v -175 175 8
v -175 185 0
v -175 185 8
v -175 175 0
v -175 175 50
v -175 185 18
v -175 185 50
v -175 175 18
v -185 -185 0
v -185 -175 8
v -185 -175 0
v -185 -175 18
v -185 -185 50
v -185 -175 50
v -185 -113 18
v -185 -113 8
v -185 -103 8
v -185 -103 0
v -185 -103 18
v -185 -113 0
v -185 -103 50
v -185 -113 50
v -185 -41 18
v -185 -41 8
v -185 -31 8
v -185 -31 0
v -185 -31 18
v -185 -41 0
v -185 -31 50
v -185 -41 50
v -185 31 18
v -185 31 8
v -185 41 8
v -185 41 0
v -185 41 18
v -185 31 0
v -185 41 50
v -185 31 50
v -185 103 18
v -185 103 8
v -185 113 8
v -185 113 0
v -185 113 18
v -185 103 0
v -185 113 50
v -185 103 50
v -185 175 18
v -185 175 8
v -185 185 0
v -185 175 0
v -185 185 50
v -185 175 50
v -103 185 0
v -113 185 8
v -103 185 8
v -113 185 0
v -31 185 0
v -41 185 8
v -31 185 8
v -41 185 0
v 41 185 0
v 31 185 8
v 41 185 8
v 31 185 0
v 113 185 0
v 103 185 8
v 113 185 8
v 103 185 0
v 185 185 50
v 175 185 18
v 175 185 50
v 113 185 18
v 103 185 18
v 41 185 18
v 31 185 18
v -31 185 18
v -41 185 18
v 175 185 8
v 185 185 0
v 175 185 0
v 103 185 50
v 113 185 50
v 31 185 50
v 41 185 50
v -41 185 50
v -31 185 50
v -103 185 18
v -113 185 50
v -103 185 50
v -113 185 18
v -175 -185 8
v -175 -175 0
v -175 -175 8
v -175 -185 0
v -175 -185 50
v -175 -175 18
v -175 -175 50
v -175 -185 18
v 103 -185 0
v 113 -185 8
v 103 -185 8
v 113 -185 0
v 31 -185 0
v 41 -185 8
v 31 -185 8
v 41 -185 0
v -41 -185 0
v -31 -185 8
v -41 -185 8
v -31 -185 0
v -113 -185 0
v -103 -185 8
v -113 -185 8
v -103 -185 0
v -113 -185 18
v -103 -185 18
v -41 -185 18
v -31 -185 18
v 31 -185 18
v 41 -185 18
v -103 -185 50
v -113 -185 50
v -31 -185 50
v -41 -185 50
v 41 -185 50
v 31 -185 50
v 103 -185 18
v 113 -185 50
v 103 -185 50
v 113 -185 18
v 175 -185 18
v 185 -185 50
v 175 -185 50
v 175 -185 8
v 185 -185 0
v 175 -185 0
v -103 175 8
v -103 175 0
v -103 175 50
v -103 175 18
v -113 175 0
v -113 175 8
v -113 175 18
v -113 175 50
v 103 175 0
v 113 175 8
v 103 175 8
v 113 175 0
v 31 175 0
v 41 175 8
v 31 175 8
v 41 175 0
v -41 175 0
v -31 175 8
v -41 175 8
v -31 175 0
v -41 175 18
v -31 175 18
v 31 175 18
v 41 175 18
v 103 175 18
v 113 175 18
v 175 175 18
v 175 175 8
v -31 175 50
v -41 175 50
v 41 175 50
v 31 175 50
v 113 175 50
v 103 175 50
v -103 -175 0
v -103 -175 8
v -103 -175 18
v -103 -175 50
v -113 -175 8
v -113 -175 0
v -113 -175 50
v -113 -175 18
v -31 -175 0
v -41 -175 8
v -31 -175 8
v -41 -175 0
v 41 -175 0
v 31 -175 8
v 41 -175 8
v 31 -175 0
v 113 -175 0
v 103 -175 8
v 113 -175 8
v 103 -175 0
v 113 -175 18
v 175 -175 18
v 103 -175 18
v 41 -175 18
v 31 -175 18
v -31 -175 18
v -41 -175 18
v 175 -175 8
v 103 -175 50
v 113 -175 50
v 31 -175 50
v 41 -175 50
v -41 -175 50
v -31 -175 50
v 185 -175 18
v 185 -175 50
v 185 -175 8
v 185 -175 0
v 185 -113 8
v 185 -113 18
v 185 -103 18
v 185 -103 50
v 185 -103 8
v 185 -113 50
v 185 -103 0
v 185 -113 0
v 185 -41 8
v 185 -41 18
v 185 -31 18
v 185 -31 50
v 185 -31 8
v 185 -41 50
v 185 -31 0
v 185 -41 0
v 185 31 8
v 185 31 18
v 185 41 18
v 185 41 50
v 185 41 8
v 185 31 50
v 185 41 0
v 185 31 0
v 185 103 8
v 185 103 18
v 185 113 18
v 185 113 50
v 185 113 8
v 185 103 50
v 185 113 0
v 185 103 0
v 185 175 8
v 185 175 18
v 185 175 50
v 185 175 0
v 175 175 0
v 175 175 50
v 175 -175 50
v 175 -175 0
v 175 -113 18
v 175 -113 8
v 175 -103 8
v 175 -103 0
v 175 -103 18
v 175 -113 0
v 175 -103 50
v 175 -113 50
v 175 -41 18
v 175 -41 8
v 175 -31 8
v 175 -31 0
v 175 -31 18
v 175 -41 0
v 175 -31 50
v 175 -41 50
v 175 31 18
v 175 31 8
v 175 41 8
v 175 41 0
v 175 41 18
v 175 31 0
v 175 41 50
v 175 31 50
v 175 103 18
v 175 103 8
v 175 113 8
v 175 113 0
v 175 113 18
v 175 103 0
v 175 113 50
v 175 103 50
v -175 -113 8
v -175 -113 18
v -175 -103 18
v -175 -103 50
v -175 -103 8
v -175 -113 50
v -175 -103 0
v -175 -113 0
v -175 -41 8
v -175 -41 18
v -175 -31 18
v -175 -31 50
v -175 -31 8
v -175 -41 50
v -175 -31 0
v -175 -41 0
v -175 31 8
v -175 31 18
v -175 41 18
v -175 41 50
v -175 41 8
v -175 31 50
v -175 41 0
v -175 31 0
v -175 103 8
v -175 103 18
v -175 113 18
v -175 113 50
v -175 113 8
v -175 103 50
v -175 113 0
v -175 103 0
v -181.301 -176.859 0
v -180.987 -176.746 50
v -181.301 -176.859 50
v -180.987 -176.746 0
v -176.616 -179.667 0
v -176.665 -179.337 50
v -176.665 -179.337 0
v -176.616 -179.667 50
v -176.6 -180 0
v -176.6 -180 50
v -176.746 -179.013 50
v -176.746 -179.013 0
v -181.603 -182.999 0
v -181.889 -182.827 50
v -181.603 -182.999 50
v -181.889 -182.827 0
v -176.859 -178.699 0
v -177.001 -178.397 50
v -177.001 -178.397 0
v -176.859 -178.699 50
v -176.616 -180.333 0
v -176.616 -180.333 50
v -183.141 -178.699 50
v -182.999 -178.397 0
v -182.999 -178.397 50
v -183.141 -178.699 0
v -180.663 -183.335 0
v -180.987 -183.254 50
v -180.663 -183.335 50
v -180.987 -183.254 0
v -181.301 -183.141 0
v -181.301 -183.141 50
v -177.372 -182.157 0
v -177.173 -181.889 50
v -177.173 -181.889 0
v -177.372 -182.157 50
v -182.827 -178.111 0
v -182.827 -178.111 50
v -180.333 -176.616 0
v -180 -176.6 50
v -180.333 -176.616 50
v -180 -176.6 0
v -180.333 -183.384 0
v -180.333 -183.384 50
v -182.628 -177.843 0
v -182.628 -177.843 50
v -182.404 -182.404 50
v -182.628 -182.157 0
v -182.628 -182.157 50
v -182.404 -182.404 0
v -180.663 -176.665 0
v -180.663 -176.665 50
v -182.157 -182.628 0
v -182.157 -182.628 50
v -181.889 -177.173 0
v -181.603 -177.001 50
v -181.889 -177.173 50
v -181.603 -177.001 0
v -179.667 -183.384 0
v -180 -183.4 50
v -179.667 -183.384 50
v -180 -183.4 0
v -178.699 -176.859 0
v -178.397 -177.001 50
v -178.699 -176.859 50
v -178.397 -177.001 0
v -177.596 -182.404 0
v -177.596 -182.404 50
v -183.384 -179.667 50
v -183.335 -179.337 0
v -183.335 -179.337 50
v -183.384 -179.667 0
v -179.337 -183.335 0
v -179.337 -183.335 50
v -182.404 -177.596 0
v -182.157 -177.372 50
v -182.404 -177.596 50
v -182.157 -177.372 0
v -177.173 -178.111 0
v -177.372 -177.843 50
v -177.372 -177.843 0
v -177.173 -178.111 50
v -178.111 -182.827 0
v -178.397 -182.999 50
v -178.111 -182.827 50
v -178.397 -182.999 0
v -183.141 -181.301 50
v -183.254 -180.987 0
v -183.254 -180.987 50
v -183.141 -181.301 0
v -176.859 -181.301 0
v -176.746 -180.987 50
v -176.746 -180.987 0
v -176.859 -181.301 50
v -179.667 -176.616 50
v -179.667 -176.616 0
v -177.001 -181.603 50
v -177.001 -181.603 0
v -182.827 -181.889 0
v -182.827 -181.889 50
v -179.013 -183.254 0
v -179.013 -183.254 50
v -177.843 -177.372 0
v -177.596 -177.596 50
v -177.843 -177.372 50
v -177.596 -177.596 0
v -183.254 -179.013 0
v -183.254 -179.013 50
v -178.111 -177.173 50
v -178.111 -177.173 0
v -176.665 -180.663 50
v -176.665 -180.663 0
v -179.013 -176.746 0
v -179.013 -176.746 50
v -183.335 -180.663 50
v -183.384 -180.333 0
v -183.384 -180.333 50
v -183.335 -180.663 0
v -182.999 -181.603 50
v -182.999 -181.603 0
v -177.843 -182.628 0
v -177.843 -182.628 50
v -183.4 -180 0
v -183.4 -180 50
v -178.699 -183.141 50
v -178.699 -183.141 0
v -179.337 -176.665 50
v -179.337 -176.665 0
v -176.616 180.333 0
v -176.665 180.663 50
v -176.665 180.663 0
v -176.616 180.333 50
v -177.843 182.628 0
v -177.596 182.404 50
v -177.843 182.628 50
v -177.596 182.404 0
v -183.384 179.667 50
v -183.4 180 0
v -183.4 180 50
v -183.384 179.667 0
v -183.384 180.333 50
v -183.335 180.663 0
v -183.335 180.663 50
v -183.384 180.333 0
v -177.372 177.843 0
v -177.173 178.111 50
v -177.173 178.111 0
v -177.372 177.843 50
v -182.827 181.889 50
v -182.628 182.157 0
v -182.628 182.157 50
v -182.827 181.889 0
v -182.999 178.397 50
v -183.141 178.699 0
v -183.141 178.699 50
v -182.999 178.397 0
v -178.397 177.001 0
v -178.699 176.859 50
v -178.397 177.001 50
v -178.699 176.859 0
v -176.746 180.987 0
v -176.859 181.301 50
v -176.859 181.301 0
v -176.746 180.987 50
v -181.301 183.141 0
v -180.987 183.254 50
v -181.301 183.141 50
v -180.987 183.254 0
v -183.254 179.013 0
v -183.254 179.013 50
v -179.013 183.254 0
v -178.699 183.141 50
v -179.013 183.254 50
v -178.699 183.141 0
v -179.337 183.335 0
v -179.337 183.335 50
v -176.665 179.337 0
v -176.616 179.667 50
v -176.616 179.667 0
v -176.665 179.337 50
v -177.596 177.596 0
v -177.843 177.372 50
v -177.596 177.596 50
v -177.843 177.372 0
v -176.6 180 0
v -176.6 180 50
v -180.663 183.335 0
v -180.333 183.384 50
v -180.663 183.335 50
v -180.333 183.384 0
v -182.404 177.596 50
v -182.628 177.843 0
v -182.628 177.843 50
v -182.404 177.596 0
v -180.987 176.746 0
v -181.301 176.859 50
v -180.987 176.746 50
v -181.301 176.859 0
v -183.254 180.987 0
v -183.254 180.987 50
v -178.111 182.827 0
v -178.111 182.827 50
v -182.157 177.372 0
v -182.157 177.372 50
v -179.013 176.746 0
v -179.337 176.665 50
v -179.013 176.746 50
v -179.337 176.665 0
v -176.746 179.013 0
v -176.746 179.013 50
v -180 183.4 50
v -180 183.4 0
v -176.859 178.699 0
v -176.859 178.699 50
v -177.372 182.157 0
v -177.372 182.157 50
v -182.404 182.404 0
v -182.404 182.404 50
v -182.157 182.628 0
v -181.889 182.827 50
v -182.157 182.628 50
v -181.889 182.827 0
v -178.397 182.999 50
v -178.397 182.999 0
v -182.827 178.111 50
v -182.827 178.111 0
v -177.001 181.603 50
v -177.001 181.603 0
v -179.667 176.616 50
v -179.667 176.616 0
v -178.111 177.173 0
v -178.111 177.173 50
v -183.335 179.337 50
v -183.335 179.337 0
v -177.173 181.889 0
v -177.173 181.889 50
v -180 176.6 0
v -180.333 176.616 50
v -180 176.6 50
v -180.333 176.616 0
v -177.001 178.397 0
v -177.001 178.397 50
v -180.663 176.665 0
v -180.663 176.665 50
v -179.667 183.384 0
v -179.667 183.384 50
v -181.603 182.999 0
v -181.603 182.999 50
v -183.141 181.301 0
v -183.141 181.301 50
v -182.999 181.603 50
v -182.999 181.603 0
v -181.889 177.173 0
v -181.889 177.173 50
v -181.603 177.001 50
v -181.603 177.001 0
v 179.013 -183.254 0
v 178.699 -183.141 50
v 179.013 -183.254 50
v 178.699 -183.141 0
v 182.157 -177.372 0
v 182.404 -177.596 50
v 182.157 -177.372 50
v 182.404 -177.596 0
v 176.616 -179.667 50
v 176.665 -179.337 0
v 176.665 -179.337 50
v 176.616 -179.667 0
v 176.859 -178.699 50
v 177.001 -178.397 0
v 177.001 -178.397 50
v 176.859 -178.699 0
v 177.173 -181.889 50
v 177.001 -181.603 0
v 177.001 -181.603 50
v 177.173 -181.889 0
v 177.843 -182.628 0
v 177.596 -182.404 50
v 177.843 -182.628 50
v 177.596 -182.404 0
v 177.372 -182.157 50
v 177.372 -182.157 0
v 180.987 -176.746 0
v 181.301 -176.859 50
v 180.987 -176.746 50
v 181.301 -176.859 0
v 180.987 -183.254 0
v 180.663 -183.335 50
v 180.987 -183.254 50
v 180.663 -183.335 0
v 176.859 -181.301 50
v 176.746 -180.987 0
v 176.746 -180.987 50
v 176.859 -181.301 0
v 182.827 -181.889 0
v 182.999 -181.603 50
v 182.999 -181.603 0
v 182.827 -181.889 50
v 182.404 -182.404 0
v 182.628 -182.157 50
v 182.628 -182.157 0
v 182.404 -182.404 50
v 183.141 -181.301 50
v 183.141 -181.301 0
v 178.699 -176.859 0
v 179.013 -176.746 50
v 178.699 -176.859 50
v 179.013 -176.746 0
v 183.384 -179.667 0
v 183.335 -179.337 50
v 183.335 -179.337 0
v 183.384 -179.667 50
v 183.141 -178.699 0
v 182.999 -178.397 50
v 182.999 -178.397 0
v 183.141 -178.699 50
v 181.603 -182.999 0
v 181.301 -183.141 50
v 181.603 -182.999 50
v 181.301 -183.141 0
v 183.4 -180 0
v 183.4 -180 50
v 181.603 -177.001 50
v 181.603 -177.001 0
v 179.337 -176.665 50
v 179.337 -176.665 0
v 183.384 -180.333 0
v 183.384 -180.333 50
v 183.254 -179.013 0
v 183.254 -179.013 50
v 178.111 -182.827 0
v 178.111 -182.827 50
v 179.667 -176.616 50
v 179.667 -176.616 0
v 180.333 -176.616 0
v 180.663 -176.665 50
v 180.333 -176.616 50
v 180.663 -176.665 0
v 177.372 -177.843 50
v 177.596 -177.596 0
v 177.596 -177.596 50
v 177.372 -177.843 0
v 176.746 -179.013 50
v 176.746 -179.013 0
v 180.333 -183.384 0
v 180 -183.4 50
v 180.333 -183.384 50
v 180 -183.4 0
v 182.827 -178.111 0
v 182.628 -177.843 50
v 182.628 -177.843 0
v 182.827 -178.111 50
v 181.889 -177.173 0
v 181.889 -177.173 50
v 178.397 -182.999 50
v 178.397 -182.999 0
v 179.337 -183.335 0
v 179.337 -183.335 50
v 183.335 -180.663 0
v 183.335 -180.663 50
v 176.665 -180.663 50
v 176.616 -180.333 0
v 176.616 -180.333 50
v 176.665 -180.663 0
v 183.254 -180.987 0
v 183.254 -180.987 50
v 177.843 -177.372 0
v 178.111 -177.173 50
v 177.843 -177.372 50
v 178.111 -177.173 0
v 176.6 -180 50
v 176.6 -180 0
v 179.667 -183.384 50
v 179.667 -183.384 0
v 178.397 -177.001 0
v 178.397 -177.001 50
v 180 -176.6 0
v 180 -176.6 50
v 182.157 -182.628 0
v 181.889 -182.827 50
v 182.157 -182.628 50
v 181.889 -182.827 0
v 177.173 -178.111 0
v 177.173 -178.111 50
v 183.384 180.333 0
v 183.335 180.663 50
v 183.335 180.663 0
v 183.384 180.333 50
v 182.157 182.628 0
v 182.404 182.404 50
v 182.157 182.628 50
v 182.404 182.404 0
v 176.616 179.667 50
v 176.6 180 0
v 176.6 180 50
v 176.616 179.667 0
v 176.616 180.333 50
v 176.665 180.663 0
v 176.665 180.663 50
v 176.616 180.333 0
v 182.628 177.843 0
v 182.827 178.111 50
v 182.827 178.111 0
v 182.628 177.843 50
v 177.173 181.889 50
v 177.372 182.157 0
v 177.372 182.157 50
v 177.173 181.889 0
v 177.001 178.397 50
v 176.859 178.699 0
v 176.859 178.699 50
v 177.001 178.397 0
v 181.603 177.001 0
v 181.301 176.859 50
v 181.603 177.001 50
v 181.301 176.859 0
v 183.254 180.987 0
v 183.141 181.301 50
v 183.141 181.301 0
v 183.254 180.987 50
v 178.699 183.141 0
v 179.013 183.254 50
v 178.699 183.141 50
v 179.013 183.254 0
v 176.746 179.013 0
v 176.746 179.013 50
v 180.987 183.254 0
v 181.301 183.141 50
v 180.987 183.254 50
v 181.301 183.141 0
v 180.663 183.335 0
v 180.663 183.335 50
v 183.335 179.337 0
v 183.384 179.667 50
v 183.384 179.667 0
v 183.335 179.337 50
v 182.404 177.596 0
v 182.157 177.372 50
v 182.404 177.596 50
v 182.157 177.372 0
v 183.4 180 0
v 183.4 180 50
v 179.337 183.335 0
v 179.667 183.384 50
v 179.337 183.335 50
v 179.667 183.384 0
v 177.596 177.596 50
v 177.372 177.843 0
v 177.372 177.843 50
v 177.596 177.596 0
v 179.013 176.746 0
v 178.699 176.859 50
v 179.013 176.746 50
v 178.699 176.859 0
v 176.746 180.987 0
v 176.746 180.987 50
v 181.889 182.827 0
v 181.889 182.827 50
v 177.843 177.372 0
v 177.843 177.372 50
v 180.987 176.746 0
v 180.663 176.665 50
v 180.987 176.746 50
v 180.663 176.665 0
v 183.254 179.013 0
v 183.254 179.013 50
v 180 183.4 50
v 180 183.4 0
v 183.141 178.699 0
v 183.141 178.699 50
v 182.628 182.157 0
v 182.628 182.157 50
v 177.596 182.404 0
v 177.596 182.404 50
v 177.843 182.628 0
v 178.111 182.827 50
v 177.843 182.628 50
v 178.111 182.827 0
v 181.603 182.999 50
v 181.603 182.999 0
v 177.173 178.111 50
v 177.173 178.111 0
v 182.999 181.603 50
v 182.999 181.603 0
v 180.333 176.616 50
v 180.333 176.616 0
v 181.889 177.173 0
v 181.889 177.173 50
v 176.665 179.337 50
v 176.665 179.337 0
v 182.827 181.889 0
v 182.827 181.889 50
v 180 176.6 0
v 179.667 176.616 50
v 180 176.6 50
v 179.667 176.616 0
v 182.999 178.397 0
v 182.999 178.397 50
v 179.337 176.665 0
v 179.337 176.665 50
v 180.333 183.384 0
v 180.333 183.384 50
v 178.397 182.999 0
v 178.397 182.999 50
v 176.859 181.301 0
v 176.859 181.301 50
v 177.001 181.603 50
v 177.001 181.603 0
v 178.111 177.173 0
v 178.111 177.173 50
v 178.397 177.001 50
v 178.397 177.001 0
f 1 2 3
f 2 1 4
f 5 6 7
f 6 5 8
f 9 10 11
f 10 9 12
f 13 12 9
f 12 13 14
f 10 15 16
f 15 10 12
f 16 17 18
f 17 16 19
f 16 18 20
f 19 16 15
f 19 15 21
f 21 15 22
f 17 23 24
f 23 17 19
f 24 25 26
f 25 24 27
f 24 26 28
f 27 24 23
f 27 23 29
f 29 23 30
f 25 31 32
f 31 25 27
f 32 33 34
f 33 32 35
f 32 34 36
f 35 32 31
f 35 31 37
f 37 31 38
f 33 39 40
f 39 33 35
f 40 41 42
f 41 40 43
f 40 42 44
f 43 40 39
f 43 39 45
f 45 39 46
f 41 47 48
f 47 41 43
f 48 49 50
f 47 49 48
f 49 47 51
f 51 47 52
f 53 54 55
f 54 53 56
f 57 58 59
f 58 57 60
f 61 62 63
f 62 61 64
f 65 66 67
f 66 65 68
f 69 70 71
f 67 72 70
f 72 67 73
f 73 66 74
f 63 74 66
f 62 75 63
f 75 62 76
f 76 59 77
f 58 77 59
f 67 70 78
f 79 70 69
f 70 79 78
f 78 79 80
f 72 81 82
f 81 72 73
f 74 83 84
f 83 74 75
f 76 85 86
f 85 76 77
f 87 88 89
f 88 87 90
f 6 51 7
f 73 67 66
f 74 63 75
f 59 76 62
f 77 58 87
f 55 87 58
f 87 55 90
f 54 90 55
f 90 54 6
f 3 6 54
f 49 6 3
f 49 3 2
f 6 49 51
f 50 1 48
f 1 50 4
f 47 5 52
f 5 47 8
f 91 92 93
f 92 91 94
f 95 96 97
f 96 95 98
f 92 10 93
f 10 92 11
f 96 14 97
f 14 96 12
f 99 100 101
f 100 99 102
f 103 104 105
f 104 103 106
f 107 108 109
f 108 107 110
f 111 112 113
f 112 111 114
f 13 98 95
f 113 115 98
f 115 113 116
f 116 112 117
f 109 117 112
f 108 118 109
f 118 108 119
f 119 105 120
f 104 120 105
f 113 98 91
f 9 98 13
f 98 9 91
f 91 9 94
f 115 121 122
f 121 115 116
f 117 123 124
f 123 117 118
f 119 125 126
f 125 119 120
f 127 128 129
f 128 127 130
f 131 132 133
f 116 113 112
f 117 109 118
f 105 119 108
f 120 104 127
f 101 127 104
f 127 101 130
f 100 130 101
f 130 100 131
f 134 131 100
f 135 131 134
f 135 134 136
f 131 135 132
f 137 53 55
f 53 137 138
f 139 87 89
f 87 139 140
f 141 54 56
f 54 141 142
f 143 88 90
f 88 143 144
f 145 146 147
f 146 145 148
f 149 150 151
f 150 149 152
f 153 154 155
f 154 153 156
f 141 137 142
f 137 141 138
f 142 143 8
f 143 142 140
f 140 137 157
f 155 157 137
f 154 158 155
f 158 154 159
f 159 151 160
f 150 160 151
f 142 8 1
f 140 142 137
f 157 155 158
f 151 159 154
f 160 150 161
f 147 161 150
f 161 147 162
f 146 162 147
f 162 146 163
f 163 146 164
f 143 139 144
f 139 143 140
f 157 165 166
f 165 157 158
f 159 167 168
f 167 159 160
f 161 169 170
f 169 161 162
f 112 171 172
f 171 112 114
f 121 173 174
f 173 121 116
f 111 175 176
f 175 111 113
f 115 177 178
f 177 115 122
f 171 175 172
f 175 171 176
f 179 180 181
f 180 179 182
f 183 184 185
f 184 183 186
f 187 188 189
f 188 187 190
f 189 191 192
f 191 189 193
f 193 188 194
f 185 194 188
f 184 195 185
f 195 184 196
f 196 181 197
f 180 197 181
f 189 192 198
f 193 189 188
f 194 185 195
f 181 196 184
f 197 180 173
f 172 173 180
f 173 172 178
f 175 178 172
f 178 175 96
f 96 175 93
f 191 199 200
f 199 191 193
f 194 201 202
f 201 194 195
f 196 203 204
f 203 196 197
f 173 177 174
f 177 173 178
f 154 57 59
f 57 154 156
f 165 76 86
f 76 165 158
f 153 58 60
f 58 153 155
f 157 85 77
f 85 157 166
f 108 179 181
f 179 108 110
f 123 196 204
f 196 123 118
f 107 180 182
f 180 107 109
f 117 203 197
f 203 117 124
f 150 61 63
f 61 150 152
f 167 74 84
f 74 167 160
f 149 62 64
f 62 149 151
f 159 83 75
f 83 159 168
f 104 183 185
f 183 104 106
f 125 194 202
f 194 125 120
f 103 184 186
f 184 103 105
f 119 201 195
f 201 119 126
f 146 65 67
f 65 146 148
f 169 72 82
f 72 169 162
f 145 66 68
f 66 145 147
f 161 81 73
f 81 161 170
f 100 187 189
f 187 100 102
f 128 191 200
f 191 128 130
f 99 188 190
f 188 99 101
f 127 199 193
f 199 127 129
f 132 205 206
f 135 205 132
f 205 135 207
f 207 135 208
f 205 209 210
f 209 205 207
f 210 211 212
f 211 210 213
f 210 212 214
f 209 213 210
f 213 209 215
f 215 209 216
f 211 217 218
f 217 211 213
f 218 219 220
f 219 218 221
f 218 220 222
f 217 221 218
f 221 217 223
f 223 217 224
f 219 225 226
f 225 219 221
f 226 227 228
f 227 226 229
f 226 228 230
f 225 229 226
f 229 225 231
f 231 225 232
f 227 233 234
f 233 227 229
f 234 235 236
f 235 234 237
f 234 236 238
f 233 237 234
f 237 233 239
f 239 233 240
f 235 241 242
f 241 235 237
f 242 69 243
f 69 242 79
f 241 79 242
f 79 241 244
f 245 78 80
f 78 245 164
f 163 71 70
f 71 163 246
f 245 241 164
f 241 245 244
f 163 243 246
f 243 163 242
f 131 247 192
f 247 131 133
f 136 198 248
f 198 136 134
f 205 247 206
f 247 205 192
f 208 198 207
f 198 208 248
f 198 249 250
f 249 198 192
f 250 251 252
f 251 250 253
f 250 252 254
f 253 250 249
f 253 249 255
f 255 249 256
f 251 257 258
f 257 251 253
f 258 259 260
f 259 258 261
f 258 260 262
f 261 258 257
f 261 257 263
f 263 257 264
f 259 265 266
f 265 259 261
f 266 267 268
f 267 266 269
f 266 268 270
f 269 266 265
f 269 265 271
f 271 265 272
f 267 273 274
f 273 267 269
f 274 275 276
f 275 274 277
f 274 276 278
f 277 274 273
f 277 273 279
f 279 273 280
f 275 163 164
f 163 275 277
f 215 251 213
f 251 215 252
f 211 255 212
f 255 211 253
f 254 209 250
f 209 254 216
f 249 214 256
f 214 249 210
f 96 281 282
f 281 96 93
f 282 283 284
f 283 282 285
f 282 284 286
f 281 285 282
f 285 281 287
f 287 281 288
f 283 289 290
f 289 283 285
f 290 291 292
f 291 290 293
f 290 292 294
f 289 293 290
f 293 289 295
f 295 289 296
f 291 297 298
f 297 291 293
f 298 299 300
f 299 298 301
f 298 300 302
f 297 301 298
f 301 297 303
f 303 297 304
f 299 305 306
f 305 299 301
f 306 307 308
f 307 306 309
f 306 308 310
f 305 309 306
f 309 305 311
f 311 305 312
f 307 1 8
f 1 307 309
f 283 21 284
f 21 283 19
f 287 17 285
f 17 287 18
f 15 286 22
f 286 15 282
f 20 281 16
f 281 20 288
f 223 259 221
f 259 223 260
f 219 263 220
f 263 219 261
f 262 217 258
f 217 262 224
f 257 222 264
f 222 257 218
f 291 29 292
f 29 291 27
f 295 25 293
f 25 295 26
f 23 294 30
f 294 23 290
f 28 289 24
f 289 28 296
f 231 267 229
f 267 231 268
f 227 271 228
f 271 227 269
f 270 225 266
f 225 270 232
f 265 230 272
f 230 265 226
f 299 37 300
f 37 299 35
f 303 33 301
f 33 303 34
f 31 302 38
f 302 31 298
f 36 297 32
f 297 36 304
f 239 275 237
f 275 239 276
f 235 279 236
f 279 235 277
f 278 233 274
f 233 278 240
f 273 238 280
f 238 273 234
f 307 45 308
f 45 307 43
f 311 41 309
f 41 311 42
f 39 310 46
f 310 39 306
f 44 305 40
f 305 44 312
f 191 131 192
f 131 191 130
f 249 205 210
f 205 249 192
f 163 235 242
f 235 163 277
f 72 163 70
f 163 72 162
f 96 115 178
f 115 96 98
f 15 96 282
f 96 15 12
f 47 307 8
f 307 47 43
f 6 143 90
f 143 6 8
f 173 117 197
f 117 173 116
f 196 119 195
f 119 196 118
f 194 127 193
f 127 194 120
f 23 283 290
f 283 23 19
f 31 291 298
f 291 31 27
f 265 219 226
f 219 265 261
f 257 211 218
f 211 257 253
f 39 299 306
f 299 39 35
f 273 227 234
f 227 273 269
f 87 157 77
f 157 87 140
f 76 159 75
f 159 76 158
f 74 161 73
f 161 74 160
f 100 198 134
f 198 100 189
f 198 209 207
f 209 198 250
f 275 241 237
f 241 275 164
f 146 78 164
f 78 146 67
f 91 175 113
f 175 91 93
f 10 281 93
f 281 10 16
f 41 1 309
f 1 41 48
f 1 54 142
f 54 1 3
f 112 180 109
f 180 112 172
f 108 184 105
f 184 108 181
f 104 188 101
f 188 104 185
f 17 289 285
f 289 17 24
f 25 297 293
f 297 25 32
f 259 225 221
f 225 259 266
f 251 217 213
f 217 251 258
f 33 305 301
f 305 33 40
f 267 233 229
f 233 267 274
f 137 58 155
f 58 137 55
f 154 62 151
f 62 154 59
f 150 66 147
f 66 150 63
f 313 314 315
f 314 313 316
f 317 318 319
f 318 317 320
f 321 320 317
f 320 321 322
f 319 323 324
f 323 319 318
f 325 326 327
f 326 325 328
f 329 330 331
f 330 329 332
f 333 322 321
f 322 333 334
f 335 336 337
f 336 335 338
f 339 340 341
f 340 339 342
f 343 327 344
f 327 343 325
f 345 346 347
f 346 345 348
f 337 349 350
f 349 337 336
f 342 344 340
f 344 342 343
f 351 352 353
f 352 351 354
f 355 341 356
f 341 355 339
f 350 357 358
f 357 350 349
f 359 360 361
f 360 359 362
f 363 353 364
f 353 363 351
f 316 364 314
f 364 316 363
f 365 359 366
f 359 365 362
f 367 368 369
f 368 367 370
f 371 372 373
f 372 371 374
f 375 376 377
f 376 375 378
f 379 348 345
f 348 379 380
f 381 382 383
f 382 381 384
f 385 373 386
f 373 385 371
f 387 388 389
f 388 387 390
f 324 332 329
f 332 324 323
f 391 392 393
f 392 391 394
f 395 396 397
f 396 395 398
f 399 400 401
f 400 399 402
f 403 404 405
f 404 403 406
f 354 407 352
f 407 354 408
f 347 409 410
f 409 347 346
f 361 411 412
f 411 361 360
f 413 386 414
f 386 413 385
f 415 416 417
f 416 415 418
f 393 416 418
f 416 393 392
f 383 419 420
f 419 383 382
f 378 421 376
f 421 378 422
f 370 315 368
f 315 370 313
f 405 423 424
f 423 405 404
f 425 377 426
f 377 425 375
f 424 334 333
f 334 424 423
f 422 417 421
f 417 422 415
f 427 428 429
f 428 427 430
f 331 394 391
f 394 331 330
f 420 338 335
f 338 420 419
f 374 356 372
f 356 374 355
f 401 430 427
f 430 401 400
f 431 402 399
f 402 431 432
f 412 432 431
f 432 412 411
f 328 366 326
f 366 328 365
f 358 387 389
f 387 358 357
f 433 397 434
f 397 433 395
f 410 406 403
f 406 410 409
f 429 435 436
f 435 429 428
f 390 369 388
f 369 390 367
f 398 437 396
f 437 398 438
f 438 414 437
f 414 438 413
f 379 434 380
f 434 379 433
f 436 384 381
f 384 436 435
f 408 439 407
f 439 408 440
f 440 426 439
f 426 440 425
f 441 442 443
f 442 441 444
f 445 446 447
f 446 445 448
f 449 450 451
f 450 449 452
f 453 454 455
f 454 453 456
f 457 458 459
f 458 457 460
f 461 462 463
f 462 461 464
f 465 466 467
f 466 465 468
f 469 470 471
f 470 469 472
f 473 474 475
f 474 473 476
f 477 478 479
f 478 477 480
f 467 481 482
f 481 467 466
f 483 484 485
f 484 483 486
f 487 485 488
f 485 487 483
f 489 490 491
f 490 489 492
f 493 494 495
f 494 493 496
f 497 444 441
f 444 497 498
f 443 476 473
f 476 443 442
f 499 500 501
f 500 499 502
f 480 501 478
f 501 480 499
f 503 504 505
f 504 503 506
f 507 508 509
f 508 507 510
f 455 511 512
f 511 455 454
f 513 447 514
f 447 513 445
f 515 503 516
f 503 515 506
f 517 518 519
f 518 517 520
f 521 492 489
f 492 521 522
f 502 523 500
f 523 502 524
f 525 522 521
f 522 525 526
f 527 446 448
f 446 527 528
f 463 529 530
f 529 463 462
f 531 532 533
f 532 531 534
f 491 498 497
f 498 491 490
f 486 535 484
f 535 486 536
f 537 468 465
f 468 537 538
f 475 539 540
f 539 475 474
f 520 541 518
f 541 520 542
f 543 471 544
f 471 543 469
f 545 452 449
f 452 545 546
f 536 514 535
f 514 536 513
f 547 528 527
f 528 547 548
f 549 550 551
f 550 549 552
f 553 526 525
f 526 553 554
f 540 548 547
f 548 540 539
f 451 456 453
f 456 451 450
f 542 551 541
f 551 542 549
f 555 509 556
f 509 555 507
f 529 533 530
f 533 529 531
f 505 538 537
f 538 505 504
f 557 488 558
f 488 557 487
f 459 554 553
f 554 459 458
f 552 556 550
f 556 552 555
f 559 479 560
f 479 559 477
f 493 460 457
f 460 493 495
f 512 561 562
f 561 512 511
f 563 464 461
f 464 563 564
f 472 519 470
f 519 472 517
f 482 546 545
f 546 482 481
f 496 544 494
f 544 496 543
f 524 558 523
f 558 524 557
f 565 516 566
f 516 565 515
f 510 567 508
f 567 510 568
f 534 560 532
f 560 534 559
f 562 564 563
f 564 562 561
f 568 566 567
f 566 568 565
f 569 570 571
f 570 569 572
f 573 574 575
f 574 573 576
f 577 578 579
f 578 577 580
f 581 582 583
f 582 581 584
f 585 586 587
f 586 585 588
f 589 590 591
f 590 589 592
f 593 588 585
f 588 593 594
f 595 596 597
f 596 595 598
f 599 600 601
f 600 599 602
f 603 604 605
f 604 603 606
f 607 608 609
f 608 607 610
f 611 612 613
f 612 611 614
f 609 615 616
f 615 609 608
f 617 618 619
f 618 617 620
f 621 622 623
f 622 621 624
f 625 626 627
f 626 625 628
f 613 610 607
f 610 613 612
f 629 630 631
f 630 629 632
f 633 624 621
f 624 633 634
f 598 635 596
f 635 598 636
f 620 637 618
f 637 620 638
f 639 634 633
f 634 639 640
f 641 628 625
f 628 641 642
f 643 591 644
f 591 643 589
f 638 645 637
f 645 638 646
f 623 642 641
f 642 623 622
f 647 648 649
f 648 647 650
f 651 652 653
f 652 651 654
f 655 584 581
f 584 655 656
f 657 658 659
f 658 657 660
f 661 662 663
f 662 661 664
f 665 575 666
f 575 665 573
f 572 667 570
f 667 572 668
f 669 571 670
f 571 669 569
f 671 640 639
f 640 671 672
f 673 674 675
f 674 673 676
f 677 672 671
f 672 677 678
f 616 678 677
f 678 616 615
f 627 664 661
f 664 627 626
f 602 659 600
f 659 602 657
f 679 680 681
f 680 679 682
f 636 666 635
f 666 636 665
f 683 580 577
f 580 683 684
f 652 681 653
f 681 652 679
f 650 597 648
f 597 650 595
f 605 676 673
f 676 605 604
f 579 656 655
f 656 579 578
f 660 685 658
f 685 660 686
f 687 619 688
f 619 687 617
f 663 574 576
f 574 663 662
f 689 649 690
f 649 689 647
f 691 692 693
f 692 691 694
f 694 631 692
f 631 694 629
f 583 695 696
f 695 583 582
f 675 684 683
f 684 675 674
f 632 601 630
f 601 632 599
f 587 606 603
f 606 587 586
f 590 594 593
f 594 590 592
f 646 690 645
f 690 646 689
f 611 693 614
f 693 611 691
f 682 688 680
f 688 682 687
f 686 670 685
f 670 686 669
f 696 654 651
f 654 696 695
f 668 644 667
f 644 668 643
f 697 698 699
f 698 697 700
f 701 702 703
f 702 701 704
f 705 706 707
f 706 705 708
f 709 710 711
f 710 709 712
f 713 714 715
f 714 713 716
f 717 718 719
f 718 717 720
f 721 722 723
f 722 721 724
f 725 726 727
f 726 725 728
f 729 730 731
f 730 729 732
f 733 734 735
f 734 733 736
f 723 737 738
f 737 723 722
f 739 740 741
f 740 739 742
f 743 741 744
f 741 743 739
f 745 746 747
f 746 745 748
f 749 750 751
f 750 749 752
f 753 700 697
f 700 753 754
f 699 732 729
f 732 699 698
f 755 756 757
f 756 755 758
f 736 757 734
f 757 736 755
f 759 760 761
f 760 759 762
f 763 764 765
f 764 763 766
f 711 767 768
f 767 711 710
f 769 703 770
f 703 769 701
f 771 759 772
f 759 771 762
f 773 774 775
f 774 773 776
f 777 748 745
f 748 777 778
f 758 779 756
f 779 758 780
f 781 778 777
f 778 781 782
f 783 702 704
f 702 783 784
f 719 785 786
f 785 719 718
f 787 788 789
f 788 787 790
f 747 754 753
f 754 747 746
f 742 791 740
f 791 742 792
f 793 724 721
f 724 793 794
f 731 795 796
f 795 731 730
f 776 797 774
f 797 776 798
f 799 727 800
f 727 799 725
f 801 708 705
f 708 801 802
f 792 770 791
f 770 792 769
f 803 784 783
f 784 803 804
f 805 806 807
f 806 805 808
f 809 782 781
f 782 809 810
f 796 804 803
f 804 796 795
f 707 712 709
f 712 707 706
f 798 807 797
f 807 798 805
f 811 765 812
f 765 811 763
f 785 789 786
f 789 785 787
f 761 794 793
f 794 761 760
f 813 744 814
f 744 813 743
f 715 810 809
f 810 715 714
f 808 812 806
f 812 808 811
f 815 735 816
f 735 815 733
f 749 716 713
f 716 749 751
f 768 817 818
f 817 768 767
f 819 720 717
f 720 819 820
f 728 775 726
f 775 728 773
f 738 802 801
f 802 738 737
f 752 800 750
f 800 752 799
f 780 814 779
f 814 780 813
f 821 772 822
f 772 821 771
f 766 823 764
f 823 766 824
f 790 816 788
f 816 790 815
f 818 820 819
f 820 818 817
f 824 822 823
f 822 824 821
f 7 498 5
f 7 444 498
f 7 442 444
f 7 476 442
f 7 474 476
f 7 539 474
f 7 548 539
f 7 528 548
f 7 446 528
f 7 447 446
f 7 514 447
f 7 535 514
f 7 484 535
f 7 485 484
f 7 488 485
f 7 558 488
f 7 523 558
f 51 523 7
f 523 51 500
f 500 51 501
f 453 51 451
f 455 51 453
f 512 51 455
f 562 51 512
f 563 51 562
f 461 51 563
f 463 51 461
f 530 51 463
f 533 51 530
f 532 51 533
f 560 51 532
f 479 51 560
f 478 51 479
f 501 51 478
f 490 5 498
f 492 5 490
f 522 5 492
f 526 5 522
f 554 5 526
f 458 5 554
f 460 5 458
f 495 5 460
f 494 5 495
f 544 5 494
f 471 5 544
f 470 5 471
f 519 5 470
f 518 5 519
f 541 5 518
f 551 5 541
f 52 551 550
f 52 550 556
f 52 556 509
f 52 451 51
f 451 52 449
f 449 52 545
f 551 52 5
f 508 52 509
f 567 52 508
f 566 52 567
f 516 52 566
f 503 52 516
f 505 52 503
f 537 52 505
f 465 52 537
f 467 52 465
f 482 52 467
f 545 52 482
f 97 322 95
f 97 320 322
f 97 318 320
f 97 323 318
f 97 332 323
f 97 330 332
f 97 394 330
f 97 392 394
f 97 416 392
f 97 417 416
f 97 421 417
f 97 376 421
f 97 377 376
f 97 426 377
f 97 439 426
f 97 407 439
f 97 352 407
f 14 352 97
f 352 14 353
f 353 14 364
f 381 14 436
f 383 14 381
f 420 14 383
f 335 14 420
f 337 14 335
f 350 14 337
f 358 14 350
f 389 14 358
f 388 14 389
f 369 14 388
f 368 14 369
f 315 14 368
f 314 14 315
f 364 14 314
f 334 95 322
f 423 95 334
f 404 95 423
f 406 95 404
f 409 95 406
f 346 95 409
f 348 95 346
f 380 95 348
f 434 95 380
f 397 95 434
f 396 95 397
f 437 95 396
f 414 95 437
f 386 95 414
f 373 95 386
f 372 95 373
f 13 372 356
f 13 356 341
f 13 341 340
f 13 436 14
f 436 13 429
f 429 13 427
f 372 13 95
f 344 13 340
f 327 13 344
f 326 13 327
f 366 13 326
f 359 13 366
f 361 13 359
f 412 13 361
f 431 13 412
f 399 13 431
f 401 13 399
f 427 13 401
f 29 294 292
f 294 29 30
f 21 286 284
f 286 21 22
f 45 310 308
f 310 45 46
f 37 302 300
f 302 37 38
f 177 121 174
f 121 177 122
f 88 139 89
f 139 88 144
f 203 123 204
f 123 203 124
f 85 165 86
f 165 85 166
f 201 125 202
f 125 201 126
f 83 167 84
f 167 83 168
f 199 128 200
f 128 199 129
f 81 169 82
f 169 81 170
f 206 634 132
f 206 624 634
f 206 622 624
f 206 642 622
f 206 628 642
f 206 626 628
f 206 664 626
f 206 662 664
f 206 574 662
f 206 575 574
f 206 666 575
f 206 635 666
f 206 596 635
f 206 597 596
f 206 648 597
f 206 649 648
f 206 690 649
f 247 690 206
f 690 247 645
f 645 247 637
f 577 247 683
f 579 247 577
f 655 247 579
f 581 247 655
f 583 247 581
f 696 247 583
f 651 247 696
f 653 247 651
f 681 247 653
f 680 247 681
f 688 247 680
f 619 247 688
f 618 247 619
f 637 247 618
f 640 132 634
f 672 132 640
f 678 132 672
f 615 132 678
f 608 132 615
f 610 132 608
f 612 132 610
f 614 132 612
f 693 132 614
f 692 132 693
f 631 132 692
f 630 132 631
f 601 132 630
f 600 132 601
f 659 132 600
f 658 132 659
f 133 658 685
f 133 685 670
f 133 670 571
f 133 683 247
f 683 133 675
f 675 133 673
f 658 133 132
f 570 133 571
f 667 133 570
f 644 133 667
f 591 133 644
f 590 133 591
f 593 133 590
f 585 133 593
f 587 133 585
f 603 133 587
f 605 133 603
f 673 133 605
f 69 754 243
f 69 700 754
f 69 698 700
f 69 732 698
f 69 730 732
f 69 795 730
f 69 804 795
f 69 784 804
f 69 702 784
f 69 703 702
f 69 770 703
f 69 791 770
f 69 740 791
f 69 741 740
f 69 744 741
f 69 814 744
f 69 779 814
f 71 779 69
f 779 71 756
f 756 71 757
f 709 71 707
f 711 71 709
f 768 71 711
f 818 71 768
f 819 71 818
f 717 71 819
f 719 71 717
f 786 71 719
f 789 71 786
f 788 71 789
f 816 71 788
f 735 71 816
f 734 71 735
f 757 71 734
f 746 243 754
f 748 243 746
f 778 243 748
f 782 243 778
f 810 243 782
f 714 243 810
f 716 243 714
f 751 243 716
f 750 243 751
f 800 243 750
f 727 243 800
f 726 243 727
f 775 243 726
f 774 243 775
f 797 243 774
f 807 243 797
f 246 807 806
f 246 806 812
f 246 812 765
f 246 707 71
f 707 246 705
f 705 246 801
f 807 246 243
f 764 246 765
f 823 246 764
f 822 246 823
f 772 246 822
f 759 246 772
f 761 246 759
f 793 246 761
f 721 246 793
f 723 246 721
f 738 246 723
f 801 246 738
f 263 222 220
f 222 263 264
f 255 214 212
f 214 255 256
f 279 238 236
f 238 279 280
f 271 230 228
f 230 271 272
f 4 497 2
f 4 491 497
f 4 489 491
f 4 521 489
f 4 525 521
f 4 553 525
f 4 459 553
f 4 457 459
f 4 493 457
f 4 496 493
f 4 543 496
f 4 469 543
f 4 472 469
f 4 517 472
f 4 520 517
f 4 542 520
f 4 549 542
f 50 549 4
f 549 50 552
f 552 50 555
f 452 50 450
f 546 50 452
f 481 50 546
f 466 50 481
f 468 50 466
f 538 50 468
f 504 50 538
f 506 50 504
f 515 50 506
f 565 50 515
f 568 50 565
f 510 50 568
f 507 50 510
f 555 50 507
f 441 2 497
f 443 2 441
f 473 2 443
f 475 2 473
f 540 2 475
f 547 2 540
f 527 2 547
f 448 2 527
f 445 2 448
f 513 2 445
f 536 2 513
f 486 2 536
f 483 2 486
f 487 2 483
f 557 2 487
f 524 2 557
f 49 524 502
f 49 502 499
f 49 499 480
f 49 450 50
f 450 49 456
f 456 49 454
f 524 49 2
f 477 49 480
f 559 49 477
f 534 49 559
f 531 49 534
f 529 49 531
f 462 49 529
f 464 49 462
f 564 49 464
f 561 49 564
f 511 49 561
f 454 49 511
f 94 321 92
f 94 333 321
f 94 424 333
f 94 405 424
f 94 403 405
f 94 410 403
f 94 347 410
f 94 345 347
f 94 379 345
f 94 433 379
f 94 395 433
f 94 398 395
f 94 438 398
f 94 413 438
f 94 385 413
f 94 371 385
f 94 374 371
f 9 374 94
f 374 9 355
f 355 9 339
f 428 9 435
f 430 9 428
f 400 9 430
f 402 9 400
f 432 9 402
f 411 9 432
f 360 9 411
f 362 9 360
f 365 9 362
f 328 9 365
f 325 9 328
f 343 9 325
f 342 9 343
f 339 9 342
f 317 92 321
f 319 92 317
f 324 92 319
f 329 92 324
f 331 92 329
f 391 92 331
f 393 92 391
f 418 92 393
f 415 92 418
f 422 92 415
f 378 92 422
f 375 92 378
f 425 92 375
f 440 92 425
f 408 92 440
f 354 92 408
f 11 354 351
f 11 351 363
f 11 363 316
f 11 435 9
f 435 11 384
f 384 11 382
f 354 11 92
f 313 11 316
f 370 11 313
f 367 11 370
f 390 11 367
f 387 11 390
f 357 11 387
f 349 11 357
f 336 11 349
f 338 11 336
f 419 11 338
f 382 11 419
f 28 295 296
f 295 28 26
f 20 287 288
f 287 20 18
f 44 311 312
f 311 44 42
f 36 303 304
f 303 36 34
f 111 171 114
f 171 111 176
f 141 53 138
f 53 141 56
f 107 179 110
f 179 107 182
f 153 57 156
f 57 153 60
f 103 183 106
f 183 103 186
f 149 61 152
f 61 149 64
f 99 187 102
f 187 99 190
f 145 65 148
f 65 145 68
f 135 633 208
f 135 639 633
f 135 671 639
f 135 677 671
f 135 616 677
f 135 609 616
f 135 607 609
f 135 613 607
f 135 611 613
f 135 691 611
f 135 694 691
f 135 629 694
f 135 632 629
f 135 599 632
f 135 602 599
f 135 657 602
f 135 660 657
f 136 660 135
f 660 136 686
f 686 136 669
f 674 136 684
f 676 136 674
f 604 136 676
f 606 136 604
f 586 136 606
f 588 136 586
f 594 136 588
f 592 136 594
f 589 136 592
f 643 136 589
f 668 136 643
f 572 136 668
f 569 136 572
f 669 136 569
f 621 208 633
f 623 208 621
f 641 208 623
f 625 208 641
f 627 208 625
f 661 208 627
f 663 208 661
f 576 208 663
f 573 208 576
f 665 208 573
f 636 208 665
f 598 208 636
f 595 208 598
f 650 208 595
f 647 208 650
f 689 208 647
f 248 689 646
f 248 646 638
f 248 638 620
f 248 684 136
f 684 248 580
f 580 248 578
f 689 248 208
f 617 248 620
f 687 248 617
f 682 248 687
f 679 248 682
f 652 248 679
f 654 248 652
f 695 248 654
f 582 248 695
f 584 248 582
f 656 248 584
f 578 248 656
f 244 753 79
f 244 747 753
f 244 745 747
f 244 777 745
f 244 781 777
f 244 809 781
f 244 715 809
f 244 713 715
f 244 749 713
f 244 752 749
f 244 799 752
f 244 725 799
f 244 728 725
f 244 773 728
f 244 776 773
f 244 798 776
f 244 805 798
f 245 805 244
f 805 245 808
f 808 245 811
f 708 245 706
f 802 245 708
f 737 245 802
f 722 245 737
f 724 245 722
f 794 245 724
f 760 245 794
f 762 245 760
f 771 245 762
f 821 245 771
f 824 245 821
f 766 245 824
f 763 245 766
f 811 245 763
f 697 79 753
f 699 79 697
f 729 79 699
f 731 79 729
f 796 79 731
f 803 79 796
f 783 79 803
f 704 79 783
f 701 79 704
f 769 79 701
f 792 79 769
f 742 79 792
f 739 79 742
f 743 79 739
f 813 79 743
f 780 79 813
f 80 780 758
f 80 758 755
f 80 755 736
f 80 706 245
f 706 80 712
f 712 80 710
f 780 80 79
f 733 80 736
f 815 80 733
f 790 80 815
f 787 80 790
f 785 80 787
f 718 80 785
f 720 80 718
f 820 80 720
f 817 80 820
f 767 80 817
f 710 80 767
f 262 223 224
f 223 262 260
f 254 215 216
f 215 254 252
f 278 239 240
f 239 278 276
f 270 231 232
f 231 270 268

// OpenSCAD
// Cage slice part (z0..z1). Units: mm.
// Print orientation: normal

bar=10;
inner=[350,350,700];
gap_xy=62;
gap_z=61;
hole_d=6.8;
$fn=64;

outer=[inner[0]+2*bar, inner[1]+2*bar, inner[2]+2*bar];
half=[outer[0]/2, outer[1]/2, outer[2]/2];

pitch_xy=bar+gap_xy;
pitch_z=bar+gap_z;

centers=[for(i=[0:5]) -(half[0]-bar/2) + i*pitch_xy];
z_levels=[for(i=[0:10]) i*pitch_z];

module vbar(xc,yc){ translate([xc-bar/2,yc-bar/2,0]) cube([bar,bar,outer[2]],center=false); }
module hbar_x(yc,z0){ translate([-half[0],yc-bar/2,z0]) cube([outer[0],bar,bar],center=false); }
module hbar_y(xc,z0){ translate([xc-bar/2,-half[1],z0]) cube([bar,outer[1],bar],center=false); }

module grid(z0){ union(){ for(yc=centers) hbar_x(yc,z0); for(xc=centers) hbar_y(xc,z0); } }

module side_verticals(){
  union(){
    for(xc=centers){ vbar(xc, half[1]-bar/2); vbar(xc,-half[1]+bar/2); }
    for(yc=centers){ vbar( half[0]-bar/2,yc); vbar(-half[0]+bar/2,yc); }
  }
}

module side_rings(){
  union(){
    for(z0=z_levels){
      hbar_x( half[1]-bar/2,z0); hbar_x(-half[1]+bar/2,z0);
      hbar_y( half[0]-bar/2,z0); hbar_y(-half[0]+bar/2,z0);
    }
  }
}

module rod_holes(){
  for(sx=[-1,1],sy=[-1,1]) translate([sx*(half[0]-bar/2), sy*(half[1]-bar/2), -1]) cylinder(d=hole_d,h=outer[2]+2,center=false);
}

module cage(){ difference(){ union(){ side_verticals(); side_rings(); grid(0); grid(outer[2]-bar); } rod_holes(); } }

module cage_slice(zmin,zmax){ intersection(){ cage(); translate([-1000,-1000,zmin]) cube([2000,2000,zmax-zmin],center=false); } }

z0=347; z1=397;
translate([0,0,-z0]) cage_slice(z0,z1);
